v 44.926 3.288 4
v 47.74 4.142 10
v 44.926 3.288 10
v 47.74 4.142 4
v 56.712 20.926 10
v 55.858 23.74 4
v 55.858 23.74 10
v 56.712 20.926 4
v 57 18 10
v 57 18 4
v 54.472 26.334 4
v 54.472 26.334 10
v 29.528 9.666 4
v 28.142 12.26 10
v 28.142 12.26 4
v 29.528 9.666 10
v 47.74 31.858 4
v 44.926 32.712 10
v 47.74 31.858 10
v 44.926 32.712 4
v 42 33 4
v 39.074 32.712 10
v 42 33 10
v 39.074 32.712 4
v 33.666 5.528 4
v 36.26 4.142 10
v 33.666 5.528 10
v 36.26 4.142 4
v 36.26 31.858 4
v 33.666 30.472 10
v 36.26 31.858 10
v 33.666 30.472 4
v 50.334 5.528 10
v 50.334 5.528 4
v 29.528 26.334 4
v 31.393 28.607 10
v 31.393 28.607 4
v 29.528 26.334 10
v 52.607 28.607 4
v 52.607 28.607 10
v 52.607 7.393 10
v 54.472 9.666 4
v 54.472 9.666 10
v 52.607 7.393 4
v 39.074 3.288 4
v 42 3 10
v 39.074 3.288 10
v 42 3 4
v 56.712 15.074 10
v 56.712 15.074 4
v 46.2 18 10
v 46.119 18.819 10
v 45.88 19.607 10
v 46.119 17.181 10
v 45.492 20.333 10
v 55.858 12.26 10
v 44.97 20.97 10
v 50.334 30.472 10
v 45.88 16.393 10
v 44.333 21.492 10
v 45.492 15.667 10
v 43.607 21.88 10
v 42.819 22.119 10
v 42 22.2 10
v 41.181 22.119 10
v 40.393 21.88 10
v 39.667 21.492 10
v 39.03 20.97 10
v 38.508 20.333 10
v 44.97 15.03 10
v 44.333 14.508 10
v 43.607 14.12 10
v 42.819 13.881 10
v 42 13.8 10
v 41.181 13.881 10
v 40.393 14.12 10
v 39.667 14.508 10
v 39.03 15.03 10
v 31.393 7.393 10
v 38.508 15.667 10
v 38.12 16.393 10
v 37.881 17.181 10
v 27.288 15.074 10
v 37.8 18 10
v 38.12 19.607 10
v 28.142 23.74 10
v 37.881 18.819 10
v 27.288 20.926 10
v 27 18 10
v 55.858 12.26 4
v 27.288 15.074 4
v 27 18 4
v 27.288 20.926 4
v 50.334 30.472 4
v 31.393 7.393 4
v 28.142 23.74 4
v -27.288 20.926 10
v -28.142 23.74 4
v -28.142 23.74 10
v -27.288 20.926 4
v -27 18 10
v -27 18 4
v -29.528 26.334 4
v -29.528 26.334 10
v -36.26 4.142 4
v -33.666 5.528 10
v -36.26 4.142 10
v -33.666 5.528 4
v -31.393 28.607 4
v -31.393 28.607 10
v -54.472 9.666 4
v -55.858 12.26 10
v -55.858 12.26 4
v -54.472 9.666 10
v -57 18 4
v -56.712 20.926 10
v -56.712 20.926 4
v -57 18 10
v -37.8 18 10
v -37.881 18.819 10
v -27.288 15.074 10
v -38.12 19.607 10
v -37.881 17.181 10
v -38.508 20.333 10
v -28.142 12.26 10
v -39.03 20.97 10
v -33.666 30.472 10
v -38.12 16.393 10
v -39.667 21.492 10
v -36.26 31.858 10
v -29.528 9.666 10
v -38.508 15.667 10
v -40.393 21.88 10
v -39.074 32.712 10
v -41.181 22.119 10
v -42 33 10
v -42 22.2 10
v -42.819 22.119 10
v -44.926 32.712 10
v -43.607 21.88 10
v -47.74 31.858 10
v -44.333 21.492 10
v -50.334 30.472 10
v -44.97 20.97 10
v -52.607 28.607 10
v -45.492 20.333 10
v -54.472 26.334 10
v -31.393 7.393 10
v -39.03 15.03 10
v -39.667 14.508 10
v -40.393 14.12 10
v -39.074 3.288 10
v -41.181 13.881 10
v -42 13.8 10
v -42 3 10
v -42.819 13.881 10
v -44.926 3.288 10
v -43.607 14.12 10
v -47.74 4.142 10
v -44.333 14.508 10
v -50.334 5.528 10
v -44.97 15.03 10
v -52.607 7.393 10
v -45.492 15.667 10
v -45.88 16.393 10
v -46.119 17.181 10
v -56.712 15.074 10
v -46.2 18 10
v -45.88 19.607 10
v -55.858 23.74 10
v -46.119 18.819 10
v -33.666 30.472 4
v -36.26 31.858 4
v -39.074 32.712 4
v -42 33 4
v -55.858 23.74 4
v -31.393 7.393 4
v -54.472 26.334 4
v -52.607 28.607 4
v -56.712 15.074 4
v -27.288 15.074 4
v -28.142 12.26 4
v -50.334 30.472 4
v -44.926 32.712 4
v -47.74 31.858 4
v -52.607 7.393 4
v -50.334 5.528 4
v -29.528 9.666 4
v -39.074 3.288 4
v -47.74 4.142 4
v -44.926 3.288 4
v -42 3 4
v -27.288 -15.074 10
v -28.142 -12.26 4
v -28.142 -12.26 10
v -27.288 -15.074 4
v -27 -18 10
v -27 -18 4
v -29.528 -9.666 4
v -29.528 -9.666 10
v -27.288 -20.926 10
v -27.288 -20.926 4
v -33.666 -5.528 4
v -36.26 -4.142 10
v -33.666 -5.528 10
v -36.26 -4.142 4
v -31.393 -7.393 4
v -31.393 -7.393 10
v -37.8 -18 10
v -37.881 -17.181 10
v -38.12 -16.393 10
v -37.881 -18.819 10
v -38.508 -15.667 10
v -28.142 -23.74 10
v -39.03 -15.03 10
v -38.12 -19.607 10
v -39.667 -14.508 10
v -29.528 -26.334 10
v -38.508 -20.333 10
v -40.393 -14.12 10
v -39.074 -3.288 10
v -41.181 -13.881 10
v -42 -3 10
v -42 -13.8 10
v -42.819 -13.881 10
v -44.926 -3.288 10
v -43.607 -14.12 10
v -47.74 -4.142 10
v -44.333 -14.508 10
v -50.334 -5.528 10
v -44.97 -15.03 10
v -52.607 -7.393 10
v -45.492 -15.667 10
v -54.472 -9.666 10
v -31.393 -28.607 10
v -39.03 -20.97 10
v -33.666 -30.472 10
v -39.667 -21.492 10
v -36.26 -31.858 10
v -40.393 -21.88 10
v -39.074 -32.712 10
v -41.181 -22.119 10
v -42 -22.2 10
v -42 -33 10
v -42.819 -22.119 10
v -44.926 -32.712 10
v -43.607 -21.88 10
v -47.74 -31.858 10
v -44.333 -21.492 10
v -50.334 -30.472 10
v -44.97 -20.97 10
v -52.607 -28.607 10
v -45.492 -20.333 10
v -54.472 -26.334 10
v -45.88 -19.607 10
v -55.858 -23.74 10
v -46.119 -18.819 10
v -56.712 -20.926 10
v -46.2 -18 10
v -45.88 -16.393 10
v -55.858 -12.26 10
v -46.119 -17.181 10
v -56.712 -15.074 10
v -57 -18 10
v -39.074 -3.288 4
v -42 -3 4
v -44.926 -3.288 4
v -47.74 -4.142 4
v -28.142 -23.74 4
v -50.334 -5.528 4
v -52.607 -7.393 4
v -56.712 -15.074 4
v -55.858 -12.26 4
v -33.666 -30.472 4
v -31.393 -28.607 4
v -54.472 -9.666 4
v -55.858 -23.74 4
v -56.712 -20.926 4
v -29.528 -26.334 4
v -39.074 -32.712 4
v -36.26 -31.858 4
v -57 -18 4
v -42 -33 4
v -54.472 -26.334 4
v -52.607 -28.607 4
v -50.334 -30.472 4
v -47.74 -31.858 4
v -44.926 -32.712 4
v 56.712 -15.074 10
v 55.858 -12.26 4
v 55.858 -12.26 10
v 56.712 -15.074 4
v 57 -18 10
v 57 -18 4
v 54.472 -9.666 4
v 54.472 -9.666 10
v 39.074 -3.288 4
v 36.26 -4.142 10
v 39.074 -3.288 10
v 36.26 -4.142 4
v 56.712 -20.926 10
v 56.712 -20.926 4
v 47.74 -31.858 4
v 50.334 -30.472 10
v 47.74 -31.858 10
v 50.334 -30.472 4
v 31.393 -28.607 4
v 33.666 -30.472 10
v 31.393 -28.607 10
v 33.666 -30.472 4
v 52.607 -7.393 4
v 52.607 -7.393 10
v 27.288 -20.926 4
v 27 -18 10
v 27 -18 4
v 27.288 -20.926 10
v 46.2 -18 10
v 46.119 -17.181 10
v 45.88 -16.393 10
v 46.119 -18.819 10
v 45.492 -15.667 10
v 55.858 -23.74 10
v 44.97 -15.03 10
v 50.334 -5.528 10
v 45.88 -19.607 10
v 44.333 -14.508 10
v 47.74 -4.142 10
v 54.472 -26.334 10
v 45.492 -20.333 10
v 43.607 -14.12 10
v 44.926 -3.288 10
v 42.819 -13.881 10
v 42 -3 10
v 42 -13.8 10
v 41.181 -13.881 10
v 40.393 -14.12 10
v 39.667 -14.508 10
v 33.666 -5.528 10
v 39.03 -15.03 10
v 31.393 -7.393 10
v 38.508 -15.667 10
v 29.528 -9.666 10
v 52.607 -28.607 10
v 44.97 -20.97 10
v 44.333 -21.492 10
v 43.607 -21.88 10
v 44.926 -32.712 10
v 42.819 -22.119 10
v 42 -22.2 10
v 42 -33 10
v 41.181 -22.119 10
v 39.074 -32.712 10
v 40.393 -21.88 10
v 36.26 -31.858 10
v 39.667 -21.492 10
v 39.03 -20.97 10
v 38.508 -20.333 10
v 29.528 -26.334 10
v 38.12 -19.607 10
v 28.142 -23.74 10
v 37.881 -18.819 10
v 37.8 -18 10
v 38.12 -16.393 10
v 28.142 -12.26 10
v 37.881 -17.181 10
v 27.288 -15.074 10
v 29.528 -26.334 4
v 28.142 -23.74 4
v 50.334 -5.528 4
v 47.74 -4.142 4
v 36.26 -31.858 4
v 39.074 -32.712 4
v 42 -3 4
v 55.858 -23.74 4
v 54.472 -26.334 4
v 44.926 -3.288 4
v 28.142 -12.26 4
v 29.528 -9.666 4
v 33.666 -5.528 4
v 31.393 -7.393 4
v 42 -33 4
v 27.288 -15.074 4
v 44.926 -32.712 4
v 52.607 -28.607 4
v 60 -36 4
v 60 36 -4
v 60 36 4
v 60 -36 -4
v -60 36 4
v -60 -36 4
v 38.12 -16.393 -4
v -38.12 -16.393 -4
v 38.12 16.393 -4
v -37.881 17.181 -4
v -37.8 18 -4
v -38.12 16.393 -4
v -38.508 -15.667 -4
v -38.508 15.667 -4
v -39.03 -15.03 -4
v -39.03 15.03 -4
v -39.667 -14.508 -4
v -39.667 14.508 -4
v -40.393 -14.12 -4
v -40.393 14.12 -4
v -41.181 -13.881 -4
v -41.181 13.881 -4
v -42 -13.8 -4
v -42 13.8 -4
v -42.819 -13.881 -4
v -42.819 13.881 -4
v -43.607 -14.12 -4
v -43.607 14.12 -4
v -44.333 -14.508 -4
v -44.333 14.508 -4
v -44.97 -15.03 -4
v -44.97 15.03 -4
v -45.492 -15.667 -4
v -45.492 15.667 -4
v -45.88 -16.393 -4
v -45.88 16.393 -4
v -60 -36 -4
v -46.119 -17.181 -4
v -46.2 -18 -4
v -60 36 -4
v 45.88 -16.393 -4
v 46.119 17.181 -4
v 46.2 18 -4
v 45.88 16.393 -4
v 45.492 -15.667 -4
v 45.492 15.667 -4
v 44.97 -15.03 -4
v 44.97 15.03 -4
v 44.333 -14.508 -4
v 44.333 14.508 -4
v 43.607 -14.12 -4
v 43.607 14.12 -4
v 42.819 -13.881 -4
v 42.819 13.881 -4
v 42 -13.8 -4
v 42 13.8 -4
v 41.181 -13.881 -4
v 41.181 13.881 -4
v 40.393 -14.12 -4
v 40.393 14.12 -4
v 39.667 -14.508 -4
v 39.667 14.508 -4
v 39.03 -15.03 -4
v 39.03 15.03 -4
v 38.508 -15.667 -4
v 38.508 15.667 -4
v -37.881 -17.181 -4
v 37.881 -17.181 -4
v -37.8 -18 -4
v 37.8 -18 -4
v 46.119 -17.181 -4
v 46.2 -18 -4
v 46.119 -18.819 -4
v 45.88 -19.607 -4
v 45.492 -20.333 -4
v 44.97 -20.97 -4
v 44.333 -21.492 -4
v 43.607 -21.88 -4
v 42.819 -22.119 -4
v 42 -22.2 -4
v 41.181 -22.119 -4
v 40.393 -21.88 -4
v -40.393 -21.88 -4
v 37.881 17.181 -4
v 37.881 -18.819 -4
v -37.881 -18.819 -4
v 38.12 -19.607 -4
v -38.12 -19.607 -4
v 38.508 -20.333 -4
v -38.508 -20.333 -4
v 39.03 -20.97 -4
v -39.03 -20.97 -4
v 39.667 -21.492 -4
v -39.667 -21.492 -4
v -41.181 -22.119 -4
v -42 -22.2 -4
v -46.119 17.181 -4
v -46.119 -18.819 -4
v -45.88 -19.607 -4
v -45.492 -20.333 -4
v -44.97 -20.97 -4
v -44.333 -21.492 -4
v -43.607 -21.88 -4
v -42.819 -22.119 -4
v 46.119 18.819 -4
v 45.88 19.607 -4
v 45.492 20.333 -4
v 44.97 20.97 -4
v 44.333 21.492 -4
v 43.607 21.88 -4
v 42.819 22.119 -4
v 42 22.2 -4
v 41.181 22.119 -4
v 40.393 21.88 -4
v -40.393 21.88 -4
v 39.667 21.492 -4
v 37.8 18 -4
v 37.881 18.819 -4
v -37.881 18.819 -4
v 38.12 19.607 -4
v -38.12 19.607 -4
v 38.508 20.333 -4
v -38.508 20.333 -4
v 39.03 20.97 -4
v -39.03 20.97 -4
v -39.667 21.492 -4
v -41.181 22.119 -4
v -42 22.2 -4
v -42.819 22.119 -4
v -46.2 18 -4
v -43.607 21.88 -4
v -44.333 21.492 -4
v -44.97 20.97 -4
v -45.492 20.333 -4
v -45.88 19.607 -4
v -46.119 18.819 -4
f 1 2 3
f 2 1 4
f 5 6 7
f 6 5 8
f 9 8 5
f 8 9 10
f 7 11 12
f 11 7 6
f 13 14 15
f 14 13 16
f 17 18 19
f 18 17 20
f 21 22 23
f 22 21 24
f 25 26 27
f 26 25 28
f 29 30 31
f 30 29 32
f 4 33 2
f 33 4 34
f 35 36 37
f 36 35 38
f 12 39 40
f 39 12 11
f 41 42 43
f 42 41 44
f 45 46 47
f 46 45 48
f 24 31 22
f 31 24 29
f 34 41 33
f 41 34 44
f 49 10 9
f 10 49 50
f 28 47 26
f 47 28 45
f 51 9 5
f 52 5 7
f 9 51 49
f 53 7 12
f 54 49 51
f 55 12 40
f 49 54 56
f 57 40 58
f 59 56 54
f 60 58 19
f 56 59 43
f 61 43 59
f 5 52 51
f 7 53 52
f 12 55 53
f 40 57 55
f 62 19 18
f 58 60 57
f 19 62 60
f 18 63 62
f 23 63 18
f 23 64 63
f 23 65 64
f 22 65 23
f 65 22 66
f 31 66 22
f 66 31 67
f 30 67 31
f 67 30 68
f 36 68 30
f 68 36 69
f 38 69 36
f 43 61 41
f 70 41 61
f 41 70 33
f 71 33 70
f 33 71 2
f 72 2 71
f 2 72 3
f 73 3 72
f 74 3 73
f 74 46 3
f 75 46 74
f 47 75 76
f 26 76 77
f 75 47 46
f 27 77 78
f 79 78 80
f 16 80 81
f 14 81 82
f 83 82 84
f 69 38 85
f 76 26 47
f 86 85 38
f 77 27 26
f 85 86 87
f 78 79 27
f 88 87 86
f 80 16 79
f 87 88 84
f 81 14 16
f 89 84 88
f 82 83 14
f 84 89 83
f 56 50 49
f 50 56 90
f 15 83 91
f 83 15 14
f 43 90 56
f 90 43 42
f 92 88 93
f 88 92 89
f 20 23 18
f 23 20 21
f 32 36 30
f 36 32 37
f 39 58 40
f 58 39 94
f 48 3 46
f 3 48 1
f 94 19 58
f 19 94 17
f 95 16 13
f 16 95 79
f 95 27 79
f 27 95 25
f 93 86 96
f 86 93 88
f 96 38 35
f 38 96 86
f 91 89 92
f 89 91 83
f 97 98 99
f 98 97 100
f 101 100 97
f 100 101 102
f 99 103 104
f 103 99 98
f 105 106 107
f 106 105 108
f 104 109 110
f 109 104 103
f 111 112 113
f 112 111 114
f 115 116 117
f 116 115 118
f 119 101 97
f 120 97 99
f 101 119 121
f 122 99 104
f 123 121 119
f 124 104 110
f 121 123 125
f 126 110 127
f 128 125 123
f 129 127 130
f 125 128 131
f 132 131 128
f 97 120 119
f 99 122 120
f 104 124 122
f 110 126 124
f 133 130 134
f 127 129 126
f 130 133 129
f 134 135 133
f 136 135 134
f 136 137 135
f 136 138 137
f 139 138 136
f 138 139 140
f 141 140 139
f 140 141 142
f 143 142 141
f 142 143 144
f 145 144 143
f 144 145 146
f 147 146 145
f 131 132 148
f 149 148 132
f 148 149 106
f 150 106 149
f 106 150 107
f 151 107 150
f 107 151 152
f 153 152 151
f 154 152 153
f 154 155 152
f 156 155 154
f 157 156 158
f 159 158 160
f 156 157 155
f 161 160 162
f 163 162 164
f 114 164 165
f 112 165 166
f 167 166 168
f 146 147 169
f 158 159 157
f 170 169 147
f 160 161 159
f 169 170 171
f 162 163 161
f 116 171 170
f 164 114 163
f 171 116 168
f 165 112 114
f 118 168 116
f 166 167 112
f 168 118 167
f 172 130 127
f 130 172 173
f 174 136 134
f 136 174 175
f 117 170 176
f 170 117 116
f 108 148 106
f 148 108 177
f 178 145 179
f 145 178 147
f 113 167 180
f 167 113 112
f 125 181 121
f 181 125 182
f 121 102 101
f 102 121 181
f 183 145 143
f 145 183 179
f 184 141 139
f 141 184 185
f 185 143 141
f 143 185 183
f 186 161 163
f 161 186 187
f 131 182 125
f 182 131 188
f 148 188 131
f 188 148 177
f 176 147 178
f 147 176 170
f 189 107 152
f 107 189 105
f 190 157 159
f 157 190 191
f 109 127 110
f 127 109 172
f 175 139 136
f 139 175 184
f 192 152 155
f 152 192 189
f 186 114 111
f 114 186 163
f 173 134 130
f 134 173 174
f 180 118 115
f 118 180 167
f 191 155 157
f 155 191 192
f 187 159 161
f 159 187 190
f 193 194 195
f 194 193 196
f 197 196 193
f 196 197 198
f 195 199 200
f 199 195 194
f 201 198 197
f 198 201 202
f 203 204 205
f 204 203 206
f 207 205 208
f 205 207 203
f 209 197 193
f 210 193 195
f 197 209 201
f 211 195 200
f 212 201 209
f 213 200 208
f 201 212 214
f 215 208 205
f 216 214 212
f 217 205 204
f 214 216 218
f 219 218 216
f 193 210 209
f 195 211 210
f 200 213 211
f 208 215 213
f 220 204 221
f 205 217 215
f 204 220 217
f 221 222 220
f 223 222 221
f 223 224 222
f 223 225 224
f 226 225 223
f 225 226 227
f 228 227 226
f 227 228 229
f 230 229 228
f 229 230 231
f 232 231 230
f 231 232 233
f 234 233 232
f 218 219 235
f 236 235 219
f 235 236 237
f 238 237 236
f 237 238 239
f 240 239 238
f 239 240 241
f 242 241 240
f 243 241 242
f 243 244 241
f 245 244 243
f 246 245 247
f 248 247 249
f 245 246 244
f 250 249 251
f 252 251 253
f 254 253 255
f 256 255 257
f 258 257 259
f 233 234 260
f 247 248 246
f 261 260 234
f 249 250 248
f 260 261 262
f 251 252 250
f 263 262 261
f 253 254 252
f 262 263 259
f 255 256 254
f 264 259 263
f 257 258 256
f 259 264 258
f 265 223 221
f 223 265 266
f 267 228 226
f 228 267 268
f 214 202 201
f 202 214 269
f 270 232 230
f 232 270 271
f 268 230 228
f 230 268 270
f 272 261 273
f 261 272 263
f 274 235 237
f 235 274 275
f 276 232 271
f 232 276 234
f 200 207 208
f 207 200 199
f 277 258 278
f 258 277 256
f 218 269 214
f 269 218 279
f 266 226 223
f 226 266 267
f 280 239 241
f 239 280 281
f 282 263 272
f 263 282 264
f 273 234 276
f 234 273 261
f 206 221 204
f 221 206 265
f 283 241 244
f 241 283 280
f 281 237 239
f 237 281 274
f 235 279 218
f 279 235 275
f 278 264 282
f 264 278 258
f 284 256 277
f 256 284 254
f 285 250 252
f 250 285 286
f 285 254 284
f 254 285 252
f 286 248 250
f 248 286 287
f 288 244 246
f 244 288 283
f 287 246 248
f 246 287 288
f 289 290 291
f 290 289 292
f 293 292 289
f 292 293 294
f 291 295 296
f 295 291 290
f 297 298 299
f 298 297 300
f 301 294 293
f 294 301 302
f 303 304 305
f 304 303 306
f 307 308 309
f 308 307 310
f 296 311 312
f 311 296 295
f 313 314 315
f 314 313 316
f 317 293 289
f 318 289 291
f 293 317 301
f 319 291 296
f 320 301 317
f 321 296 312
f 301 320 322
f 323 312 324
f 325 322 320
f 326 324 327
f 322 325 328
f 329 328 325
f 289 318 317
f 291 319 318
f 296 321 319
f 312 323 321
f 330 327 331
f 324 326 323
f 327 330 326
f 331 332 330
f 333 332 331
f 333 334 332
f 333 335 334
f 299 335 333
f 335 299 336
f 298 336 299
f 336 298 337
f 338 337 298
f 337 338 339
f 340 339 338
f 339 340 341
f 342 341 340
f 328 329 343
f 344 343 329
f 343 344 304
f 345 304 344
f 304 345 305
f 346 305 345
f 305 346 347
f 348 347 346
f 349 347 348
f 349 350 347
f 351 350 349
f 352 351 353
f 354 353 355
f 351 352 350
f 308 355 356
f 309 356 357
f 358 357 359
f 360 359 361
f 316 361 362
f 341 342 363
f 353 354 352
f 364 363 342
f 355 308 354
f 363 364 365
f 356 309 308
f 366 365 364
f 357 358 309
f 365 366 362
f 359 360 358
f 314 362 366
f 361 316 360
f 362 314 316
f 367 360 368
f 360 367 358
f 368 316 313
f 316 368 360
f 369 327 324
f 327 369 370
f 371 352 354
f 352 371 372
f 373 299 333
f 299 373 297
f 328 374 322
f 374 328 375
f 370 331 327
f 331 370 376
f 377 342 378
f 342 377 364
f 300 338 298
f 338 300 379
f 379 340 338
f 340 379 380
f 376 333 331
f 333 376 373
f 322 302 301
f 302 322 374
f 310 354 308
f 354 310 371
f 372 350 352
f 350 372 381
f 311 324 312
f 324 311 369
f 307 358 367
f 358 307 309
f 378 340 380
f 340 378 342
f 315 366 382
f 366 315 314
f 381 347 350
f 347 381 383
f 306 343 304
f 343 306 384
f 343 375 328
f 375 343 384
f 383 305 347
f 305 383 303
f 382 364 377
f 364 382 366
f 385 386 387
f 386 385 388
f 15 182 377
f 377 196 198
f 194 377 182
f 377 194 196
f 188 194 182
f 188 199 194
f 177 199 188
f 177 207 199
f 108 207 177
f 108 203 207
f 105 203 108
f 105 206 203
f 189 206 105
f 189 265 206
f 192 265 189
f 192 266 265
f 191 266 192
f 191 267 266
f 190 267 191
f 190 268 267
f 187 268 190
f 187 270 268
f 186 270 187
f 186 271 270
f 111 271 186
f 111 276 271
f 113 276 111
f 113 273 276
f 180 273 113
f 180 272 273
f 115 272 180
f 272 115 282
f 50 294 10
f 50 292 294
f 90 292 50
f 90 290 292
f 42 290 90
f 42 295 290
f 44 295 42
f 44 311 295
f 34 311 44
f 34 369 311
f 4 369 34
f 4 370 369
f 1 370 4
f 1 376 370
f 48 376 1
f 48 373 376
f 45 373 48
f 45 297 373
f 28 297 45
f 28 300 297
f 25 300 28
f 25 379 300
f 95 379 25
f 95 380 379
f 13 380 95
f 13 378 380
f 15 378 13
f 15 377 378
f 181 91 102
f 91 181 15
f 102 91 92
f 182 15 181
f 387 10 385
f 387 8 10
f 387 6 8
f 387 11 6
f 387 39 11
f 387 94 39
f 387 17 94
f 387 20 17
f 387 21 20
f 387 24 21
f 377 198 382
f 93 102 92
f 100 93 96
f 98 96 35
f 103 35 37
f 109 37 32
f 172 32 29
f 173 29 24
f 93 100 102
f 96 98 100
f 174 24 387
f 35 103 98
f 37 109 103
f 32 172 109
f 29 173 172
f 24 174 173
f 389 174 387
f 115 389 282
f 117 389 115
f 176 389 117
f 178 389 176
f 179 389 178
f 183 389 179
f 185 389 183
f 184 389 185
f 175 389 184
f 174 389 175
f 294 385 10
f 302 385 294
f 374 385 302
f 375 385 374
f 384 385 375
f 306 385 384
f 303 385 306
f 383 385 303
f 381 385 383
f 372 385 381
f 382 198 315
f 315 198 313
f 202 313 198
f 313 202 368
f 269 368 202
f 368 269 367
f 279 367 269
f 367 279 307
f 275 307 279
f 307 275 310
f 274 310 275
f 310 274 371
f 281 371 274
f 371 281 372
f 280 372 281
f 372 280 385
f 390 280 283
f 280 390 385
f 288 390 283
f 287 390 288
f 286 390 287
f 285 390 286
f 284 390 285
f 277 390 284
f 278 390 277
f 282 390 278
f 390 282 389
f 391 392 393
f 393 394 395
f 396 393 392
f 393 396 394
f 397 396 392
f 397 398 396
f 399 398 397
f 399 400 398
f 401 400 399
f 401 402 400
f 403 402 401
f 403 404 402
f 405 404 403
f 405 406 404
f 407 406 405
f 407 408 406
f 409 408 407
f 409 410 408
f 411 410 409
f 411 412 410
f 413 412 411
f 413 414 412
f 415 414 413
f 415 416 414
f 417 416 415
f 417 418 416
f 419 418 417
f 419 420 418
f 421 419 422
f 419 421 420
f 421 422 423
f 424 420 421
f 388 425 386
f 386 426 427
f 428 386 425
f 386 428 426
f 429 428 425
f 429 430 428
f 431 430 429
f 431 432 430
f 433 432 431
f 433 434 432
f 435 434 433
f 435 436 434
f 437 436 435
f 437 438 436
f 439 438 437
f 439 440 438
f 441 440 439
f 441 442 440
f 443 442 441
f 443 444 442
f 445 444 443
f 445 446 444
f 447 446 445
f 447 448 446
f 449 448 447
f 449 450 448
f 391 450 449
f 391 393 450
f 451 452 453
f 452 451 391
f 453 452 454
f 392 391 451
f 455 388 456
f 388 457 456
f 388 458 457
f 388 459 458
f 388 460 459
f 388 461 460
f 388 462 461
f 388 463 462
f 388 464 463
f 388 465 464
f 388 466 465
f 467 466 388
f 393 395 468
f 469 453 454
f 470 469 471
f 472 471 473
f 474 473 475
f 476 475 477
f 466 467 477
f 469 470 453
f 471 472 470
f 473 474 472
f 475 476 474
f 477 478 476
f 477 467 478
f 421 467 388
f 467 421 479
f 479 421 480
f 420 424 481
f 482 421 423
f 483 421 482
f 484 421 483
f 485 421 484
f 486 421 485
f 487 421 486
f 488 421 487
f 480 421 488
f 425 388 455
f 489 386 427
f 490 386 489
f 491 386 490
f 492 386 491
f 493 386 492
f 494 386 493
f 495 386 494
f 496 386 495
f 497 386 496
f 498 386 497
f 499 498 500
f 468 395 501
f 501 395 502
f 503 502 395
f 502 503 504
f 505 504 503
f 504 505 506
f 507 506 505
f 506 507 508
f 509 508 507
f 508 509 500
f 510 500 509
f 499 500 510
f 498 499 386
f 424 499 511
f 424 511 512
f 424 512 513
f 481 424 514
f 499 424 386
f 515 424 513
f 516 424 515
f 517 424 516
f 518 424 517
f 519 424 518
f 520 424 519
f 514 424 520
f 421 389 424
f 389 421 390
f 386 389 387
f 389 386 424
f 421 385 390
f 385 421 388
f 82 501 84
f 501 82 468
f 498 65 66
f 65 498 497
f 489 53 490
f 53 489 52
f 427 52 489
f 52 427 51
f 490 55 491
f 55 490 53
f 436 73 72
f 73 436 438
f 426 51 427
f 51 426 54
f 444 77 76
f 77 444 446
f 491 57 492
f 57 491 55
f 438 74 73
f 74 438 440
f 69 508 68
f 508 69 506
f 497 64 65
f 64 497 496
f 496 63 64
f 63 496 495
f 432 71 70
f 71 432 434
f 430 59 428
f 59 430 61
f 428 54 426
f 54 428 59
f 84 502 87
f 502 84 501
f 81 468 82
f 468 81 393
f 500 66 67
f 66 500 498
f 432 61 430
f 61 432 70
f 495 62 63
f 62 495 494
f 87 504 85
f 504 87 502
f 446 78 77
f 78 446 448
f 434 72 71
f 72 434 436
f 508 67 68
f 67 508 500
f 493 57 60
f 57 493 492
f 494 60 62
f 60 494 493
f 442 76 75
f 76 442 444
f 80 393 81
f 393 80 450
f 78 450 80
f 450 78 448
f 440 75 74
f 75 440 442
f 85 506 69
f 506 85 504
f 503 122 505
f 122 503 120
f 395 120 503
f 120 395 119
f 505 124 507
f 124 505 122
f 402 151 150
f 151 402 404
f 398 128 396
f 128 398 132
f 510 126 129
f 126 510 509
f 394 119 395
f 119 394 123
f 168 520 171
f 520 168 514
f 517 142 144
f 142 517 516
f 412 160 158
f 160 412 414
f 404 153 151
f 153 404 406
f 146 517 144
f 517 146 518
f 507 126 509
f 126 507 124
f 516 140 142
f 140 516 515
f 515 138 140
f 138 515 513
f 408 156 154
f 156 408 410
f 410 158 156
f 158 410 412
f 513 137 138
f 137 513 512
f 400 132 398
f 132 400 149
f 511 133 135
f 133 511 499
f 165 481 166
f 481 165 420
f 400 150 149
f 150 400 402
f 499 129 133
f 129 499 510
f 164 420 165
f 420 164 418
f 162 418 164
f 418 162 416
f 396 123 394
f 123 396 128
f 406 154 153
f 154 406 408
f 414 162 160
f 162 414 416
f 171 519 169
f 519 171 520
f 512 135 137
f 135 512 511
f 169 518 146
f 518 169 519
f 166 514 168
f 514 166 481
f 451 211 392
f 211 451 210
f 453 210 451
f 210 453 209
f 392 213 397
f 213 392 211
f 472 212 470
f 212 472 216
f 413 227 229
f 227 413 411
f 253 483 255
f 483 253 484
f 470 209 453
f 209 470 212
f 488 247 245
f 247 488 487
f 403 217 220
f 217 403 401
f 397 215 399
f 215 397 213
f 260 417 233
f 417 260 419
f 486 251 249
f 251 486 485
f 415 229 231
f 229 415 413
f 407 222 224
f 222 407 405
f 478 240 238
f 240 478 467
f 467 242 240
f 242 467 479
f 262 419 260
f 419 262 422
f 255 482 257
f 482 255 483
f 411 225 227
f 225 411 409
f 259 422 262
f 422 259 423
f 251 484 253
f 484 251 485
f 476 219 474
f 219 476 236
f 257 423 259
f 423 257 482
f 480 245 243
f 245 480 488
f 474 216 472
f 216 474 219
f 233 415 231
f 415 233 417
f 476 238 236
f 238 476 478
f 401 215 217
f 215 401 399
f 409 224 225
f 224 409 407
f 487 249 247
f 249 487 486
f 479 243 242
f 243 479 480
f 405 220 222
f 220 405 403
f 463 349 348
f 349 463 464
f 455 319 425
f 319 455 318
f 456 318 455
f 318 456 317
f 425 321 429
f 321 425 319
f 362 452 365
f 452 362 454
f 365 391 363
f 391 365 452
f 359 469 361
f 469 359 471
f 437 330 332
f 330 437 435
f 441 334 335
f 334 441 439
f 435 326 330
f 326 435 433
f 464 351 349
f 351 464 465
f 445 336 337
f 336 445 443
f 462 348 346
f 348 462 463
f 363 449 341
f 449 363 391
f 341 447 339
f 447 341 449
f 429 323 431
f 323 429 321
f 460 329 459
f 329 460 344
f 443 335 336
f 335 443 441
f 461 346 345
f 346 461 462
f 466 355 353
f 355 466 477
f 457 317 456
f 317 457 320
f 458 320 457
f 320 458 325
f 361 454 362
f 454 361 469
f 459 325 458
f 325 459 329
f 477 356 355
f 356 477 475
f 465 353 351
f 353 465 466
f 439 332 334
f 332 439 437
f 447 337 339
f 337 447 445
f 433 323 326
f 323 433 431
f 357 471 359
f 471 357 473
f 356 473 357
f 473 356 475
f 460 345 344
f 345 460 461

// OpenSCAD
$fn = 32;

// ----------------------------------------------------------------------
// Anchor pads 120 x 72 x 14
// four corner bosses with anchor holes
// ----------------------------------------------------------------------

// --- parameters (mm) ---
plate = [120, 72, 8];  // base plate size (x, y, z)
pads = 4;              // boss count, one per corner
edge = 18;             // boss centre offset from the plate edge
boss_d = 30;           // boss diameter
boss_h = 6;            // boss height above the base plate
hole_d = 8.4;          // hole diameter

// --- derived feature positions (mm) ---
height = plate[2] + boss_h;      // = 14   overall height of the part
corner_x = plate[0] / 2 - edge;  // = 42   boss centre X
corner_y = plate[1] / 2 - edge;  // = 18   boss centre Y
feature_centers = [
  [corner_x, corner_y],
  [-corner_x, corner_y],
  [-corner_x, -corner_y],
  [corner_x, -corner_y]
];   // boss centres, anchor holes are drilled there

// base plate, four bosses standing on it, anchor holes all the way through
difference() {
  union() {
    cube(plate, center = true);
    for (centre = feature_centers)
      translate([centre[0], centre[1], plate[2] / 2 - 1])
        cylinder(d = boss_d, h = boss_h + 1);
  }
  for (centre = feature_centers)
    translate([centre[0], centre[1], -height])
      cylinder(d = hole_d, h = 2 * height + 2);  // through boss and plate
}
